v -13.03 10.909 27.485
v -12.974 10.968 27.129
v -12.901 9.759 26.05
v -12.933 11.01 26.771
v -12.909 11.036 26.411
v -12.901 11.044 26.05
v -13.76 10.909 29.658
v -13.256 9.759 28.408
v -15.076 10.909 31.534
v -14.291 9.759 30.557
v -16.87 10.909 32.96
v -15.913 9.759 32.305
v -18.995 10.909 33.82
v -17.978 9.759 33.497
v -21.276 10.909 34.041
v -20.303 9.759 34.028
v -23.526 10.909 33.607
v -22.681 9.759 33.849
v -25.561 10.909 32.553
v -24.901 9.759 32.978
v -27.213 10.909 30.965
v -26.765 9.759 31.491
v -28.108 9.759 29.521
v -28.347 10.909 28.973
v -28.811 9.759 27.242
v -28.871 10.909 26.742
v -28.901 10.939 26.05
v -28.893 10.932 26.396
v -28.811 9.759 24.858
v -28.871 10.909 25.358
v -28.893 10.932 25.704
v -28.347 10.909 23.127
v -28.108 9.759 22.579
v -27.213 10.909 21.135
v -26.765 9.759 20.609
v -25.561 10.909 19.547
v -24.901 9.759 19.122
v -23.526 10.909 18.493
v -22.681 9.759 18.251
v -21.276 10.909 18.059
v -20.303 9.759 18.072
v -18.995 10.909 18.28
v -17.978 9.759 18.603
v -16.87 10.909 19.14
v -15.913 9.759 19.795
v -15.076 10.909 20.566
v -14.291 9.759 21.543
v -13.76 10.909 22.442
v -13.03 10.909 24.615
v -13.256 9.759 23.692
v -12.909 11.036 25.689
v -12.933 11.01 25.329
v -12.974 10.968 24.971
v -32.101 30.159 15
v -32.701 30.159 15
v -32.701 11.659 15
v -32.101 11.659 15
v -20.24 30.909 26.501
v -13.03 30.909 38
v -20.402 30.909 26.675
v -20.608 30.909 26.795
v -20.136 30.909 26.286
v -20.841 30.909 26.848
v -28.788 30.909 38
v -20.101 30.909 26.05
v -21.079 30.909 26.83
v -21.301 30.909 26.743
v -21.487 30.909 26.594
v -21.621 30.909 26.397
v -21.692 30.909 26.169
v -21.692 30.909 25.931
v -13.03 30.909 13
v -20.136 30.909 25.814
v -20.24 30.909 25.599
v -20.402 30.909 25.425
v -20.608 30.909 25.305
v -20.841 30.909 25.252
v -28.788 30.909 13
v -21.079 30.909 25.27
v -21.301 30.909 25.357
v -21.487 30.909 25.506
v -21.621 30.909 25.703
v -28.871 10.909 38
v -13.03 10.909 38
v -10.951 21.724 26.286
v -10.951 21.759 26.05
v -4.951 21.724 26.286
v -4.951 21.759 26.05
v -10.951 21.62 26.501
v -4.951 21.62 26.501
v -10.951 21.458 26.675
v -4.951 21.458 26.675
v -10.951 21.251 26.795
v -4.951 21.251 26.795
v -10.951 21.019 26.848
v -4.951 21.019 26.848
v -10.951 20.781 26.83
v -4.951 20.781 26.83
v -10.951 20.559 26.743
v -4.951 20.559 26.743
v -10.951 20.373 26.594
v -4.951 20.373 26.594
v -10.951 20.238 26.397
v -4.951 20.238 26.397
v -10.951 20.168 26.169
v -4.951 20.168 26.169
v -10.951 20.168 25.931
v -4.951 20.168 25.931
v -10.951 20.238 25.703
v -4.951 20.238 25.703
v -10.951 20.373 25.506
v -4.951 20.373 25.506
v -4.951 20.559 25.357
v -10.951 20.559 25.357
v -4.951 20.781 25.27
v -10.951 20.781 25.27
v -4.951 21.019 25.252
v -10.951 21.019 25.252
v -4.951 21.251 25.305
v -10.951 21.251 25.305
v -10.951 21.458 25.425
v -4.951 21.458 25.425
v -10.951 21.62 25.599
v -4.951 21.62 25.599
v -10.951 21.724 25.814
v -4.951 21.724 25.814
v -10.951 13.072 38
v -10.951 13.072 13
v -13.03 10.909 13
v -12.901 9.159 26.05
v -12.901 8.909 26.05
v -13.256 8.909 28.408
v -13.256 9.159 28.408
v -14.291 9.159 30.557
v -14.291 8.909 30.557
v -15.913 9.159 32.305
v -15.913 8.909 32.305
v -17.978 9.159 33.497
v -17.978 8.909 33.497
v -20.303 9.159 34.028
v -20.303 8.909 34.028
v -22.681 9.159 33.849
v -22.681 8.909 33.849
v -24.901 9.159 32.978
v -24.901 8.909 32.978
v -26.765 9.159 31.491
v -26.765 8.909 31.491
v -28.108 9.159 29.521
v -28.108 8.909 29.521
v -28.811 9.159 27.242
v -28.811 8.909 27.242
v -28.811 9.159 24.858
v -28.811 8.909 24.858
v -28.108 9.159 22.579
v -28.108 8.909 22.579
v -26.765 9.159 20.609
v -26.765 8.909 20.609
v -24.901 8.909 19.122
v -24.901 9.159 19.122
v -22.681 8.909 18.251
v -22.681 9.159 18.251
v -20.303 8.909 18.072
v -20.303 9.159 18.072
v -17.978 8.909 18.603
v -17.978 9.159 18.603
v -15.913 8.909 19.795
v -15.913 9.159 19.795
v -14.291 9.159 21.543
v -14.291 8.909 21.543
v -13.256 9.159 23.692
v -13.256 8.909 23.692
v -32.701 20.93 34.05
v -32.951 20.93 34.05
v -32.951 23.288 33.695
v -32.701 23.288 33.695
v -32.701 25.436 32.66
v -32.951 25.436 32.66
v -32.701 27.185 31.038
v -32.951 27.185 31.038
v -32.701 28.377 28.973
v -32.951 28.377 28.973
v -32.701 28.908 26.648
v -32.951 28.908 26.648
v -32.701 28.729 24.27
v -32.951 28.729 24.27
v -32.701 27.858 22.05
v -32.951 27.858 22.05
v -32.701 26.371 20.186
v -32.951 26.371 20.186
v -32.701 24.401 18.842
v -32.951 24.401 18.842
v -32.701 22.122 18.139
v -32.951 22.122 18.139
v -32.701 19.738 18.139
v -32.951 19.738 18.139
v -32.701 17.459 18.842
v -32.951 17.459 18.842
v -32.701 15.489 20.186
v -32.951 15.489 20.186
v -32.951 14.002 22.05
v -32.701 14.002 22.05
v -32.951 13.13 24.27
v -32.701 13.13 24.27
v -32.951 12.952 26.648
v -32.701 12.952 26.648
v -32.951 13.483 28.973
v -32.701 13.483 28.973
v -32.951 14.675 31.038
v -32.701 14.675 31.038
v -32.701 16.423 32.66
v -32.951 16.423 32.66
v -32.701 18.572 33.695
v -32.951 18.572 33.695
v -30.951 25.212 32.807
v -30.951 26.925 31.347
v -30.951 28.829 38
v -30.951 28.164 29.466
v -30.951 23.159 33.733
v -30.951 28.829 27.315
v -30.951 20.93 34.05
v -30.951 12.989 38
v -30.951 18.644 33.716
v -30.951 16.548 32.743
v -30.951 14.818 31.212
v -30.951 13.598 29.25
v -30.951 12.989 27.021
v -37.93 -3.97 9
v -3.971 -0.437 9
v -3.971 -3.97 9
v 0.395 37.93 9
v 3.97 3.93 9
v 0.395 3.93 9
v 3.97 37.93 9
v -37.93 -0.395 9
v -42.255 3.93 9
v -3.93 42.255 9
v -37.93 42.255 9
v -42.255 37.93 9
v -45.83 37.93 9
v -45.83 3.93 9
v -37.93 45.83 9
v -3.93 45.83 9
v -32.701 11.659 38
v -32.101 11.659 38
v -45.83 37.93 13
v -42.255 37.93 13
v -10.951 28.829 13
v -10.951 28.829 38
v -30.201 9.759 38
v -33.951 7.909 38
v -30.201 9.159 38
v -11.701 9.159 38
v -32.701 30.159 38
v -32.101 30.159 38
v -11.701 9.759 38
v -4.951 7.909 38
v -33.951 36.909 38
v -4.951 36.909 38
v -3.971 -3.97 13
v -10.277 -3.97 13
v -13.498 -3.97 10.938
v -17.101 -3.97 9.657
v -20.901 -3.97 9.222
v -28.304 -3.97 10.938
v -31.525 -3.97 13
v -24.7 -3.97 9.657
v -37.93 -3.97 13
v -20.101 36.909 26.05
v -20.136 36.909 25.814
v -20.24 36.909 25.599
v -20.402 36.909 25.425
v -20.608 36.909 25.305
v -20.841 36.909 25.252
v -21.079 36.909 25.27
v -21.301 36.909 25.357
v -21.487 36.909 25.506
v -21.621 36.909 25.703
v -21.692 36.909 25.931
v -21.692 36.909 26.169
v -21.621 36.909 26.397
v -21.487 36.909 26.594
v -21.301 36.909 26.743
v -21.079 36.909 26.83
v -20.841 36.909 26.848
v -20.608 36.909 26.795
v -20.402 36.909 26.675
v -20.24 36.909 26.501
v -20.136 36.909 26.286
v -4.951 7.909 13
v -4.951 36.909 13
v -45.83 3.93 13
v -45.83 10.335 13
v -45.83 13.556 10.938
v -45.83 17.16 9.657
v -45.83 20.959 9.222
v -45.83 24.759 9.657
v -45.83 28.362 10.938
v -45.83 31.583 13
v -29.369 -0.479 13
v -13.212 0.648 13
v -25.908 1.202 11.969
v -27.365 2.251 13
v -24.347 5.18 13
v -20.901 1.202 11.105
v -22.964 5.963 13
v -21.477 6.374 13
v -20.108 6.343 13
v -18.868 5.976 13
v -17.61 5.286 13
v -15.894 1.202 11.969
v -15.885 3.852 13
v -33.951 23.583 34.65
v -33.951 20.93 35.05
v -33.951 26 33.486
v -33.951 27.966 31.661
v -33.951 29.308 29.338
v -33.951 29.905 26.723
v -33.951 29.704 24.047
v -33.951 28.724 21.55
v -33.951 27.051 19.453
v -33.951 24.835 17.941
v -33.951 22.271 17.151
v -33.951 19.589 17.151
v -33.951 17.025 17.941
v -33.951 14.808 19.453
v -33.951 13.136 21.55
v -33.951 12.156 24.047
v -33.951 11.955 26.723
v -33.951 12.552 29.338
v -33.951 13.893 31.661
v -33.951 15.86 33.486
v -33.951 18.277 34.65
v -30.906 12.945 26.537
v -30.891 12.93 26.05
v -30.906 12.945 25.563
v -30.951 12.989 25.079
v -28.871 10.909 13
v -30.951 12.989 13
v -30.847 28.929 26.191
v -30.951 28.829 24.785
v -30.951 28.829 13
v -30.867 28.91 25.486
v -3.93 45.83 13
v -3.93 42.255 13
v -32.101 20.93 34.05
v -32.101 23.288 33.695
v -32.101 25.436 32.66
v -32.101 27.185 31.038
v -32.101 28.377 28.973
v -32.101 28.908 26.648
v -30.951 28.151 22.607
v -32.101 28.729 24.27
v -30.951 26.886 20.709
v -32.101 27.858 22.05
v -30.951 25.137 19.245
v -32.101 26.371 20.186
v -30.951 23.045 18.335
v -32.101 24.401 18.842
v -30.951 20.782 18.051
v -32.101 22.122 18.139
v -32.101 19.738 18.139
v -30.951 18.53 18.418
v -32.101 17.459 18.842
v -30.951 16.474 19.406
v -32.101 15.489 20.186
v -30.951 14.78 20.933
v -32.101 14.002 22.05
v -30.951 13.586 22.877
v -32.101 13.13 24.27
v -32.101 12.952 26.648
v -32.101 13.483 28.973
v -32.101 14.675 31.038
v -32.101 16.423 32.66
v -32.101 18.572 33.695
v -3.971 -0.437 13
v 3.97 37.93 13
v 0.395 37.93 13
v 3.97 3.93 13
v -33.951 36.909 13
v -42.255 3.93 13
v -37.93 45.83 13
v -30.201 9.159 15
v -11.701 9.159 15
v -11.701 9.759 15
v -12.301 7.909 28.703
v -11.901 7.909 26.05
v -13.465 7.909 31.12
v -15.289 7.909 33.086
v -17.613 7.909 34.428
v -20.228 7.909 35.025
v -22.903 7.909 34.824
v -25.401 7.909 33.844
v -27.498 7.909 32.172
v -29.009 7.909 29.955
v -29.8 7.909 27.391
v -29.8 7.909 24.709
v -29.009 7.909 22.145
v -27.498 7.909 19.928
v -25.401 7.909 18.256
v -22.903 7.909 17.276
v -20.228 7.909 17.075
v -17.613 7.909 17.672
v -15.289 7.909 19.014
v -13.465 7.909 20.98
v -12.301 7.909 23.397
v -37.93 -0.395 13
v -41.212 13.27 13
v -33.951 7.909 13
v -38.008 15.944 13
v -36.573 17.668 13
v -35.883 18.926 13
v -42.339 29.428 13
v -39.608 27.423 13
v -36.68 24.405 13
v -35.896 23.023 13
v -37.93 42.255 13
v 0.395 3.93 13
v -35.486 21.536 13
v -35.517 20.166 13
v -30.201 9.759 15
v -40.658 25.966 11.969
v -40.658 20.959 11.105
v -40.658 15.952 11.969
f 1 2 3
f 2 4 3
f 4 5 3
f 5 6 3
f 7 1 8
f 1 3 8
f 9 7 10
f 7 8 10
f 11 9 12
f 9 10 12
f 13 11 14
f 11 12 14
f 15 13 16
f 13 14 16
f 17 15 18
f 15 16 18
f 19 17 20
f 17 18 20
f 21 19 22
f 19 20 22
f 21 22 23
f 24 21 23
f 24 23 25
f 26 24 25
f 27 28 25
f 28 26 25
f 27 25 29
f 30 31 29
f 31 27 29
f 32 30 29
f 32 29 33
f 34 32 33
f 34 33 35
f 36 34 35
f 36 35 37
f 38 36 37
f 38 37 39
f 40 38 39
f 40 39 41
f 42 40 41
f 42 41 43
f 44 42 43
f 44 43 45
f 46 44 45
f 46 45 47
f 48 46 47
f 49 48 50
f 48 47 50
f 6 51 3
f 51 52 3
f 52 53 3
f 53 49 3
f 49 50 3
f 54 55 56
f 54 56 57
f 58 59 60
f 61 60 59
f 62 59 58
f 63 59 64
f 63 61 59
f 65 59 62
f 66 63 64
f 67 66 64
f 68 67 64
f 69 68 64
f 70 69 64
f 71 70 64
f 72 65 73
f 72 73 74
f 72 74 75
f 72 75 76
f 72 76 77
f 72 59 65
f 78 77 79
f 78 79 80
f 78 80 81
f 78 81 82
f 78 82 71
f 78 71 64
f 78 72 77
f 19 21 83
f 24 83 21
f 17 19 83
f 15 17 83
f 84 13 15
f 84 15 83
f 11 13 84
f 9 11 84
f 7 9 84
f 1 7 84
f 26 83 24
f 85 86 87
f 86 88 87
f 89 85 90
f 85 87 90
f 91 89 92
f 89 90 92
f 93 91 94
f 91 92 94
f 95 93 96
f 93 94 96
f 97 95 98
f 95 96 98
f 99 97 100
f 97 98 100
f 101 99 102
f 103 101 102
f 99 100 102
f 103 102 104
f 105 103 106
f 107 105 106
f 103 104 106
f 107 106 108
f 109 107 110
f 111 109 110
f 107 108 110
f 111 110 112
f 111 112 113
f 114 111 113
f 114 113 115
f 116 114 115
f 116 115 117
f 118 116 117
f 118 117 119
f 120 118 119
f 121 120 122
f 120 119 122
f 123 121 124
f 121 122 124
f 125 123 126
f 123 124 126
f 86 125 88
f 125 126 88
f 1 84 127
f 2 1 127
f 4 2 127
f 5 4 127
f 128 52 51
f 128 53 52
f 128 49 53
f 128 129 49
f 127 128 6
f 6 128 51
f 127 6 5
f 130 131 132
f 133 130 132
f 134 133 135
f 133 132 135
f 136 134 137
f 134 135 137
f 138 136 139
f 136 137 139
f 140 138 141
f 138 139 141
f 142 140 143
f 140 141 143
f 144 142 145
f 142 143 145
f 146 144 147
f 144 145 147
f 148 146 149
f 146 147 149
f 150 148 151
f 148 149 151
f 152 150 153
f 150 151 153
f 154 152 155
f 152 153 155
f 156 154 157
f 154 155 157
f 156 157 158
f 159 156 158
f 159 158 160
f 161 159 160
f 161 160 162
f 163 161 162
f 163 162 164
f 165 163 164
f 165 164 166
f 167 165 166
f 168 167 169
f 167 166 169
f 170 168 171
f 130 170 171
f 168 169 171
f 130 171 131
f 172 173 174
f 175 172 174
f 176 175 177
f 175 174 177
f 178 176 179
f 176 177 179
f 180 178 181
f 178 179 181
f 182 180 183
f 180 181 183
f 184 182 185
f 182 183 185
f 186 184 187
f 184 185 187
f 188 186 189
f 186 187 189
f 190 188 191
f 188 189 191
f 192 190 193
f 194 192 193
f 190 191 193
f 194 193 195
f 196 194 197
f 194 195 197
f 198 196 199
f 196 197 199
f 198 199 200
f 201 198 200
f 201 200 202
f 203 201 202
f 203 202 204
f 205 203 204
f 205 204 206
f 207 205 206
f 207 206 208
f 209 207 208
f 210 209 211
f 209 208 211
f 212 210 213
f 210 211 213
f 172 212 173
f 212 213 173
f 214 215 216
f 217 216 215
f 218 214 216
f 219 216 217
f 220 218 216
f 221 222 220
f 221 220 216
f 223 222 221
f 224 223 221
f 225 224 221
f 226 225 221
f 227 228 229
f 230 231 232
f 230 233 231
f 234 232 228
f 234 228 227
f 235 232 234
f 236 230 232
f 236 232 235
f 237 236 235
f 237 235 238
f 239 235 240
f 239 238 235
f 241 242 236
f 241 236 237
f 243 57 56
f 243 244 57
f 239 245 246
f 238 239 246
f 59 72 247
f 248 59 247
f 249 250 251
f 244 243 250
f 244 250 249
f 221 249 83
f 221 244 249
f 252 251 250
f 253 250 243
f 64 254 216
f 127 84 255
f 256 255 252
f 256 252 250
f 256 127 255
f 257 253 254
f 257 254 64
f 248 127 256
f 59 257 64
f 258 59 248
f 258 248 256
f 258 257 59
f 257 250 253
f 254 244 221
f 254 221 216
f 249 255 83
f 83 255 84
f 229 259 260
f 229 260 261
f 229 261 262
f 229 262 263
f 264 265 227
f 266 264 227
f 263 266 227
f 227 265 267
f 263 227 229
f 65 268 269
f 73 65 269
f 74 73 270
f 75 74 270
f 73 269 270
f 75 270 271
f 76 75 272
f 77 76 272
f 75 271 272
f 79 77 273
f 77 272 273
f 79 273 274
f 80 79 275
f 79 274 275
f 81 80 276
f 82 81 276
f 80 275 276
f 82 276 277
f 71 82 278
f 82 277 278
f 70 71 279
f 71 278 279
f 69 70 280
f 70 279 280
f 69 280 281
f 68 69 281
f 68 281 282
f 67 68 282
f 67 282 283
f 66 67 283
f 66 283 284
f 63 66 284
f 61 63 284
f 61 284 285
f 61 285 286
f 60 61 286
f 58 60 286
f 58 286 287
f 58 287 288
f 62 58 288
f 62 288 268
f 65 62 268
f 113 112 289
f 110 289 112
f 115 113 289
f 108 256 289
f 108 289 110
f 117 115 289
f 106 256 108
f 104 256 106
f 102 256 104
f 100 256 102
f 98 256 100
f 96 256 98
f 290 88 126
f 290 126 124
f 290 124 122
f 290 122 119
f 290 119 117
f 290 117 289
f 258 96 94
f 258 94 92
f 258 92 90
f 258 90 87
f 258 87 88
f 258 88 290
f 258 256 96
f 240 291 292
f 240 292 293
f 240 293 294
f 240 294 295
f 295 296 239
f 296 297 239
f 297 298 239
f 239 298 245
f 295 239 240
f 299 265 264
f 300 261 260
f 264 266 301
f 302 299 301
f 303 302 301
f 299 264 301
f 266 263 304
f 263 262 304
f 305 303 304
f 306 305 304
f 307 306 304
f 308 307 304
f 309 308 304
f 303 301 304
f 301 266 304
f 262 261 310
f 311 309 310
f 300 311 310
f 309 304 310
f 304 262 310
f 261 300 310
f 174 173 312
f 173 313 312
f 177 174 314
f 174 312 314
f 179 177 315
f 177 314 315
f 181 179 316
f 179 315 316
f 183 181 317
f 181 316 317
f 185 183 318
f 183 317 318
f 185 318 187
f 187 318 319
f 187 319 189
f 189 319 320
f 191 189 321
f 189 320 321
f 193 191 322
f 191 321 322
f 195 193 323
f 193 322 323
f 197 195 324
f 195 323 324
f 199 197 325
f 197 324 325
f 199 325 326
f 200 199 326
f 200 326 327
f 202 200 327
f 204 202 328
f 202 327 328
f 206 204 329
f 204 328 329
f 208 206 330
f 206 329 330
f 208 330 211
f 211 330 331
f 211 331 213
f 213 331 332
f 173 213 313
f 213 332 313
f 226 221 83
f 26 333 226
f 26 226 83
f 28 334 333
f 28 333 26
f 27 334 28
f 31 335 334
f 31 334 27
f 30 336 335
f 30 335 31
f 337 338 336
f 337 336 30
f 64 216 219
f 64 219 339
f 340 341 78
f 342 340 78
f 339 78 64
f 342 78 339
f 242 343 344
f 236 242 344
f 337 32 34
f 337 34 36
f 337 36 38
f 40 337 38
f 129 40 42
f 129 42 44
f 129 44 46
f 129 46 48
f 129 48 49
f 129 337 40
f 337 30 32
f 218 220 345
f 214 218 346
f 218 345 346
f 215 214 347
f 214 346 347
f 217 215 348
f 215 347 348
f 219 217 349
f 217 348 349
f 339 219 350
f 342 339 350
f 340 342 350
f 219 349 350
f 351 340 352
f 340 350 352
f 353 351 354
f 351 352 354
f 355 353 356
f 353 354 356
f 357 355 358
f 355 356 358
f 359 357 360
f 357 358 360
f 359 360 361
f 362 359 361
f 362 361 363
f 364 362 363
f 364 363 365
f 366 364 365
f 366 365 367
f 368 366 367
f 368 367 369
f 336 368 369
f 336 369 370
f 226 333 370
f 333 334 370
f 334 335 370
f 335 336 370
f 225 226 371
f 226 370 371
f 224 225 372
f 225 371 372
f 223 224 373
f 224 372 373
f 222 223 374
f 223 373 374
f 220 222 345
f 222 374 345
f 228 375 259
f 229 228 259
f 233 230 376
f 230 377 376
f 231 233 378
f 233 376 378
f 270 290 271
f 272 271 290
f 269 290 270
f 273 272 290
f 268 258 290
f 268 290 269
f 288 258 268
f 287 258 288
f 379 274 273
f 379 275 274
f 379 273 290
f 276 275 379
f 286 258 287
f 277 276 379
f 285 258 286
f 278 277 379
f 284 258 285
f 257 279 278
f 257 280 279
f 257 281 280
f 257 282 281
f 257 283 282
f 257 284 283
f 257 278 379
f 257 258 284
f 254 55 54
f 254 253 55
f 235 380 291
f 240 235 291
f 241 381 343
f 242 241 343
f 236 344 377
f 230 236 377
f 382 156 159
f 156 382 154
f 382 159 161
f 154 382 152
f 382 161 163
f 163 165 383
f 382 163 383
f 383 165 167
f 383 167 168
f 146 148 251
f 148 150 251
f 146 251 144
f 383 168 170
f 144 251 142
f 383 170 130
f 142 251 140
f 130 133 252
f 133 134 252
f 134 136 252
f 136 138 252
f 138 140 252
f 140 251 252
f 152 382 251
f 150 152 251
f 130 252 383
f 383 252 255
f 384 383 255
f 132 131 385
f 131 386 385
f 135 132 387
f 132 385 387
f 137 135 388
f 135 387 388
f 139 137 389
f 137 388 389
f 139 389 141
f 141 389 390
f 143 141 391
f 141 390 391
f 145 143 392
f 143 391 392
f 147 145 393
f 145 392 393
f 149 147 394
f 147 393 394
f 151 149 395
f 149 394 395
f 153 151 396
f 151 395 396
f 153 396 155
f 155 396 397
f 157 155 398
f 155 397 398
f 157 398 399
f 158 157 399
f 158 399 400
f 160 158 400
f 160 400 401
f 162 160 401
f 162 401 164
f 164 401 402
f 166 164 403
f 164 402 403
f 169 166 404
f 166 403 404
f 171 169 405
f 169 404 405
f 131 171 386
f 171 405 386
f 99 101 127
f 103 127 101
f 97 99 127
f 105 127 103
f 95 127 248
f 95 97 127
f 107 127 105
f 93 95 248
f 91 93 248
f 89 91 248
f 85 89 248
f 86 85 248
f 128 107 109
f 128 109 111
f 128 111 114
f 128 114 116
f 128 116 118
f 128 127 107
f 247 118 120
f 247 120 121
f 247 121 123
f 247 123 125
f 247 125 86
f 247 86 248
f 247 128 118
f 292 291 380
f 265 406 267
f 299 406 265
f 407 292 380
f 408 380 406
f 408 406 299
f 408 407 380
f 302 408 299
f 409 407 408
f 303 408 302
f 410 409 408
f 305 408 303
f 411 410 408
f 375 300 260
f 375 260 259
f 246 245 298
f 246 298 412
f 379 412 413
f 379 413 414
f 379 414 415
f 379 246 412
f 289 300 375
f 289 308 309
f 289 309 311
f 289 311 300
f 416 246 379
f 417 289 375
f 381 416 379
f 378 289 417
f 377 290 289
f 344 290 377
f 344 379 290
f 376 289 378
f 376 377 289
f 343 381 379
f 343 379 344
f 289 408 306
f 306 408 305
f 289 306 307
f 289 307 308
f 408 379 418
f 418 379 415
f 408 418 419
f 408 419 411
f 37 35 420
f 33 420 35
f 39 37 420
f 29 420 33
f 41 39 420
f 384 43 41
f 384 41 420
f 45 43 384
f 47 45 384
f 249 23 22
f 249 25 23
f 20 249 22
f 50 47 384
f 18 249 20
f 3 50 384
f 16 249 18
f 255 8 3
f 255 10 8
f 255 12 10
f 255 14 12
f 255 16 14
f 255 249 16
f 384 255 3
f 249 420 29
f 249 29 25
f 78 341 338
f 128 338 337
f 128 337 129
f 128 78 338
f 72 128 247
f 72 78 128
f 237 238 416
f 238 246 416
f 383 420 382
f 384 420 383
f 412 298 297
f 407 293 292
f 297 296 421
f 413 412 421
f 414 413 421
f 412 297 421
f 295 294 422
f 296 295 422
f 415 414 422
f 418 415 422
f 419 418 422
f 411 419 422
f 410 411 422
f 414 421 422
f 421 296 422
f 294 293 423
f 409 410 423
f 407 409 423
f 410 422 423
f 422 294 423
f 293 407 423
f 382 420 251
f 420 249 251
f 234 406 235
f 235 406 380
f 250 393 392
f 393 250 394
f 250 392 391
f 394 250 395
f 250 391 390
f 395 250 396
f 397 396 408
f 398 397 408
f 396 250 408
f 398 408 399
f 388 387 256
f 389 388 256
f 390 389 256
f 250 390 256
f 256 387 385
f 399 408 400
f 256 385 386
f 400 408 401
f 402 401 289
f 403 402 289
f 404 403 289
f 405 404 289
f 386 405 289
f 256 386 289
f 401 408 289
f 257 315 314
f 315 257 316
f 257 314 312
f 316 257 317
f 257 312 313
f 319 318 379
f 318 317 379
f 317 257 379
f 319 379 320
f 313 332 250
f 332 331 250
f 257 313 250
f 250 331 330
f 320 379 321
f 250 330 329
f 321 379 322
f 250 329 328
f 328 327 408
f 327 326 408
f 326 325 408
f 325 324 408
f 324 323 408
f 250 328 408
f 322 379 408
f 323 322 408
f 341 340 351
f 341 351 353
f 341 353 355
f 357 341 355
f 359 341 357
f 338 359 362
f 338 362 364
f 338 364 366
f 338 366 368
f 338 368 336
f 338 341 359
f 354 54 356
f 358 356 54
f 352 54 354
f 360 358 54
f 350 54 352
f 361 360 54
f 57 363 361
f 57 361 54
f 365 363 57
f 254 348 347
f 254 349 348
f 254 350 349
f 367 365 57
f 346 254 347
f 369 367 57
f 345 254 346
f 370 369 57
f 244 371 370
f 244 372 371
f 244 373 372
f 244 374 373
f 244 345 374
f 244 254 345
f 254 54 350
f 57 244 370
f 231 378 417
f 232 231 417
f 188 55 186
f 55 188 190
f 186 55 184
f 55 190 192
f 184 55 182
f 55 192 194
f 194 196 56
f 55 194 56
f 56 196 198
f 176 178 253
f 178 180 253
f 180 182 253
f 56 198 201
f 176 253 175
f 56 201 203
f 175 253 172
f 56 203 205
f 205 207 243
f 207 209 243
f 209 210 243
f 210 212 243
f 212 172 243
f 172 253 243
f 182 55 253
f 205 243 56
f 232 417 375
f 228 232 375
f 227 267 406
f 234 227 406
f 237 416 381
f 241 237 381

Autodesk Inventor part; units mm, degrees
ref_plane "YZ Plane" through (0, 0, 0) normal (1, 0, 0) x (0, 1, 0)
ref_plane "XZ Plane" through (0, 0, 0) normal (0, 1, 0) x (-1, 0, 0)
ref_plane "Work Plane1" through (0, 0, 10) normal (0, 0, 1) x (1, 0, 0)
sketch "Sketch1" plane through (0, 0, 10) normal (0, 0, 1) x (1, 0, 0)
  line L0 (-4.0299, -0.3538) -> (-2.2322, 1.4439) construction
  arc A0 (-1.4439, 2.2322) -> (-2.2322, 1.4439) centre (-0.9299, 0.9299) ccw construction
  line L1 (-1.4439, 2.2322) -> (0.3538, 4.0299) construction
  line L2 (-37.8299, 42.8299) -> (-37.8299, 37.8299) construction
  line L3 (-37.8299, 37.8299) -> (-42.9208, 37.8299) construction
  line L4 (-37.8299, 42.2137) -> (-37.8299, 45.8299) construction
  line L5 (-37.8299, 45.8299) -> (-4.0299, 45.8299) construction
  line L6 (-4.0299, 45.8299) -> (-4.0299, 42.2137) construction
  line L7 (-4.0299, 4.0299) -> (0.3538, 4.0299) projected
  circle A1 centre (-20.9299, 20.9299) radius 17.5 projected
  line L8 (-20.9299, 58.9723) -> (17.1124, 20.9299) construction
  line L9 (17.1124, 20.9299) -> (-20.9299, -17.1124) construction
  line L10 (-20.9299, -17.1124) -> (-58.9723, 20.9299) construction
  line L11 (-58.9723, 20.9299) -> (-20.9299, 58.9723) construction
  line L12 (-20.9299, 58.9723) -> (-20.9299, -17.1124) construction
  line L13 (17.1124, 20.9299) -> (-58.9723, 20.9299) construction
  line L14 (-20.9299, 58.9723) -> (32.8701, 58.9723) construction
  line L15 (-43.4299, 43.4299) -> (1.5701, 43.4299) construction
  line L16 (1.5701, 43.4299) -> (1.5701, -1.5701) construction
  line L17 (1.5701, -1.5701) -> (-43.4299, -1.5701) construction
  line L18 (-43.4299, -1.5701) -> (-43.4299, 43.4299) construction
  line L19 (-43.4299, 43.4299) -> (1.5701, -1.5701) construction
  line L20 (1.5701, 43.4299) -> (-43.4299, -1.5701) construction
  line L21 (-43.4299, 5.3876) -> (-43.4299, 36.4723)
  line L22 (-43.4299, 36.4723) -> (-36.4723, 43.4299)
  line L23 (-36.4723, 43.4299) -> (-5.3876, 43.4299)
  line L24 (-5.3876, 43.4299) -> (1.5701, 36.4723)
  line L25 (1.5701, 36.4723) -> (1.5701, 5.3876)
  line L26 (1.5701, 5.3876) -> (-5.3876, -1.5701)
  line L27 (-5.3876, -1.5701) -> (-36.4723, -1.5701)
  line L28 (-36.4723, -1.5701) -> (-43.4299, 5.3876)
  line L29 (-4.0299, 42.2137) -> (-37.8299, 42.2137) projected
  line L30 (-4.0299, -0.3538) -> (-4.0299, 4.0299) projected
  circle A2 centre (-20.9299, 20.9299) radius 1.5
  line L31 (-10.9299, 10.9299) -> (-30.9299, 10.9299) construction
  line L32 (-30.9299, 10.9299) -> (-30.9299, 30.9299) construction
  line L33 (-30.9299, 30.9299) -> (-10.9299, 30.9299) construction
  line L34 (-10.9299, 30.9299) -> (-10.9299, 10.9299) construction
  line L35 (-10.9299, 10.9299) -> (-30.9299, 30.9299) construction
  line L36 (-30.9299, 10.9299) -> (-10.9299, 30.9299) construction
  circle A3 centre (-30.9299, 30.9299) radius 1.4
  circle A4 centre (-30.9299, 10.9299) radius 1.4
  circle A5 centre (-10.9299, 10.9299) radius 1.4
  line L37 (-45.8299, 37.8299) -> (-42.0723, 37.8299) construction
  line L38 (-42.1723, 37.7299) -> (-45.8299, 37.7299)
  line L39 (-45.8299, 37.7299) -> (-45.8299, 4.1299)
  line L40 (-45.8299, 4.1299) -> (-42.1723, 4.1299)
  line L41 (-42.1723, 4.1299) -> (-42.1723, 37.7299)
  line L42 (-45.8299, 4.0299) -> (-42.0723, 4.0299) construction
  line L43 (-45.8299, 37.8299) -> (-42.0723, 37.8299) projected
  line L44 (-37.7299, 45.8299) -> (-4.1299, 45.8299)
  line L45 (-4.1299, 45.8299) -> (-4.1299, 42.1723)
  line L46 (-4.1299, 42.1723) -> (-37.7299, 42.1723)
  line L47 (-37.7299, 42.1723) -> (-37.7299, 45.8299)
  line L48 (0.4701, 37.8299) -> (0.4701, 4.0299) construction
  line L49 (0.4701, 4.0299) -> (3.9701, 4.0299) construction
  line L50 (3.9701, 37.8299) -> (3.9701, 4.0299) construction
  line L51 (0.4701, 37.8299) -> (3.9701, 37.8299) construction
  line L52 (-45.8299, -3.9701) -> (-4.0299, -3.9701) construction
  line L53 (0.3124, 37.7299) -> (3.9701, 37.7299)
  line L54 (3.9701, 37.7299) -> (3.9701, 4.1299)
  line L55 (3.9701, 4.1299) -> (0.3124, 4.1299)
  line L56 (0.3124, 4.1299) -> (0.3124, 37.7299)
  line L57 (-4.1713, -0.3538) -> (-37.7299, -0.3538)
  line L58 (-37.7299, -0.3538) -> (-37.7299, -3.9701)
  line L59 (-37.7299, -3.9701) -> (-4.1713, -3.9701)
  line L60 (-4.1713, -3.9701) -> (-4.1713, -0.3538)
  point P0 (-37.8299, 4.0299)
  dimension "d18" = 53.8
  dimension "d19" = 45
  dimension "d20" = 53.8
  dimension "d21" = 45
  dimension "d22" = 45
  dimension "d30" = 20
  dimension "d31" = 20
  dimension "d32" = 2.8
  dimension "d33" = 2.8
  dimension "d34" = 2.8
  dimension "d35" = 3
  dimension "d36" = 0.1
  dimension "d37" = 0.1
  dimension "d38" = 0.1
  dimension "d39" = 0.1
extrude "Extrusion1" add sketch "Sketch1" along normal blind 3 contours L30 L26 L57 L28 L41 L22 L46 L24 L56 L7 | L7 L26 L30 | L56 L24 L25 L26 | L26 L25 L24 L53 L54 L55 | L60 L59 L58 L57 L28 L27 L26 | L26 L27 L28 L57 | L46 L22 L29 L24 | L24 L29 L45 | L40 L39 L38 L22 L21 L28 | L28 L21 L22 L41 | L29 L22 L23 L24 | L24 L23 L22 L29 L47 L44 L45 | L47 L29 L22 | A1 | A2 | A3 | A4 | A5
sketch "Skizze4" plane through (0, 0, 13) normal (0, 0, 1) x (1, 0, 0)
  line L0 (-37.7299, 42.1723) -> (-42.1723, 37.7299) projected
  line L1 (-42.1723, 37.7299) -> (-45.8299, 37.7299) projected
  line L2 (-45.8299, 37.7299) -> (-45.8299, 4.1299) construction
  line L3 (-45.8299, 4.1299) -> (-42.1723, 4.1299) projected
  line L4 (-42.1723, 4.1299) -> (-37.6885, -0.3538) projected
  line L5 (-37.6885, -0.3538) -> (-37.7299, -0.3538) projected
  line L6 (-37.7299, -0.3538) -> (-37.7299, -3.9701) projected
  line L7 (-37.7299, -3.9701) -> (-4.1713, -3.9701) construction
  line L8 (-4.1713, -3.9701) -> (-4.1713, -0.3538) projected
  line L9 (-4.1713, -0.3538) -> (0.3124, 4.1299) projected
  line L10 (0.3124, 4.1299) -> (3.9701, 4.1299) projected
  line L11 (3.9701, 4.1299) -> (3.9701, 37.7299) construction
  line L12 (3.9701, 37.7299) -> (0.3124, 37.7299) projected
  line L13 (0.3124, 37.7299) -> (-4.1299, 42.1723) projected
  line L14 (-4.1299, 42.1723) -> (-4.1299, 45.8299) projected
  line L15 (-4.1299, 45.8299) -> (-37.7299, 45.8299) construction
  line L16 (-37.7299, 45.8299) -> (-37.7299, 42.1723) projected
  line L17 (-37.9299, 46.0299) -> (-3.9299, 46.0299) construction
  line L18 (-3.9299, 46.0299) -> (-3.9299, 42.2551)
  line L19 (-3.9299, 42.2551) -> (0.3953, 37.9299)
  line L20 (0.3953, 37.9299) -> (4.1701, 37.9299)
  line L21 (4.1701, 37.9299) -> (4.1701, 3.9299) construction
  line L22 (4.1701, 3.9299) -> (0.3953, 3.9299)
  line L23 (0.3953, 3.9299) -> (-3.9713, -0.4367)
  line L24 (-3.9713, -0.4367) -> (-3.9713, -4.1701)
  line L25 (-3.9713, -4.1701) -> (-37.9299, -4.1701) construction
  line L26 (-37.9299, -4.1701) -> (-37.9299, -0.3953)
  line L27 (-37.9299, -0.3953) -> (-42.2551, 3.9299)
  line L28 (-42.2551, 3.9299) -> (-46.0299, 3.9299)
  line L29 (-46.0299, 3.9299) -> (-46.0299, 37.9299) construction
  line L30 (-46.0299, 37.9299) -> (-42.2551, 37.9299)
  line L31 (-42.2551, 37.9299) -> (-37.9299, 42.2551)
  line L32 (-37.9299, 42.2551) -> (-37.9299, 46.0299)
  line L33 (-45.8299, 37.7299) -> (-45.8299, 37.9299)
  line L34 (-4.1299, 45.8299) -> (-37.7299, 45.8299) projected
  line L35 (-37.7299, 45.8299) -> (-37.9299, 45.8299)
  line L36 (-4.1299, 45.8299) -> (-3.9299, 45.8299)
  line L37 (3.9701, 37.7299) -> (3.9701, 37.9299)
  line L38 (3.9701, 4.1299) -> (3.9701, 37.7299) projected
  line L39 (3.9701, 4.1299) -> (3.9701, 3.9299)
  line L40 (-4.1713, -3.9701) -> (-3.9713, -3.9701)
  line L41 (-37.7299, -3.9701) -> (-37.9299, -3.9701)
  line L42 (-45.8299, 4.1299) -> (-45.8299, 3.9299)
  point P0 (0, 0)
  dimension "d40" = 0.2
extrude "IM_offset" add sketch "Skizze4" against normal up to surface (3 mm away)
ref_plane "Arbeitsebene5" through (-20.9299, 3.9299, 10) normal (1, 0, 0) x (0, 0, -1)
ref_plane "Arbeitsebene6" through (-37.9299, 20.9299, 10) normal (0, 1, 0) x (1, 0, 0)
sketch "Skizze25" plane through (0, 0, 13) normal (0, 0, 1) x (1, 0, 0)
  line L0 (3.9701, 3.9299) -> (3.9701, 37.9299) projected
  line L1 (3.9701, 37.9299) -> (0.3953, 37.9299) projected
  line L2 (0.3953, 37.9299) -> (-3.9299, 42.2551) projected
  line L3 (-3.9299, 42.2551) -> (-3.9299, 45.8299) projected
  line L4 (-3.9299, 45.8299) -> (-37.9299, 45.8299) projected
  line L5 (-37.9299, 45.8299) -> (-37.9299, 42.2551) projected
  line L6 (-37.9299, 42.2551) -> (-42.2551, 37.9299) projected
  line L7 (-42.2551, 37.9299) -> (-45.8299, 37.9299) projected
  line L8 (-45.8299, 37.9299) -> (-45.8299, 3.9299) projected
  line L9 (-42.2551, 3.9299) -> (-45.8299, 3.9299) projected
  line L10 (-37.9299, -0.3953) -> (-42.2551, 3.9299) projected
  line L11 (-37.9299, -3.9701) -> (-37.9299, -0.3953) projected
  line L12 (-3.9713, -3.9701) -> (-37.9299, -3.9701) projected
  line L13 (-3.9713, -3.9701) -> (-3.9713, -0.4367) projected
  line L14 (-3.9713, -0.4367) -> (0.3953, 3.9299) projected
  line L15 (0.3953, 3.9299) -> (3.9701, 3.9299) projected
  line L16 (-9.2627, 11.384) -> (-30.4759, 32.5972)
  line L17 (-11.384, 9.2627) -> (-32.5972, 30.4759)
  line L18 (-10.9506, 30.9092) -> (-30.9506, 30.9092)
  line L19 (-30.9506, 30.9092) -> (-30.9506, 10.9092)
  line L20 (-30.9506, 10.9092) -> (-10.9506, 10.9092)
  line L21 (-10.9506, 10.9092) -> (-10.9506, 30.9092)
  line L22 (-10.9506, 30.9092) -> (-30.9506, 10.9092) construction
  line L23 (-30.9506, 30.9092) -> (-10.9506, 10.9092) construction
  line L24 (-7.9506, 33.9092) -> (-33.9506, 33.9092)
  line L25 (-33.9506, 33.9092) -> (-33.9506, 7.9092)
  line L26 (-33.9506, 7.9092) -> (-7.9506, 7.9092)
  line L27 (-7.9506, 7.9092) -> (-7.9506, 33.9092)
  line L28 (-10.9506, 14.9092) -> (-7.9506, 14.9092)
  line L29 (-26.9506, 30.9092) -> (-26.9506, 33.9092)
  line L30 (-13.0305, 10.9092) -> (-10.9506, 13.072)
  line L31 (-30.9506, 28.8293) -> (-28.7879, 30.9092)
  line L32 (-13.0305, 30.9092) -> (-10.9506, 28.8293)
  line L33 (-30.9506, 12.9891) -> (-28.8707, 10.9092)
  point P0 (0, 0)
  point P1 (-20.9506, 20.9092)
  dimension "d150" = 20
  dimension "d151" = 20
  dimension "d152" = 3
  dimension "d153" = 7
  dimension "d154" = 7
extrude "Extrusion21" add sketch "Skizze25" along normal blind 25 contours L21 L28 L27 L26 L25 L24 L29 L18 L19 L20 | L21 L20 L30 | L31 L19 L18 | L21 L18 L29 L24 L27 L28 | L32 L18 L21 | L20 L19 L33
ref_plane "Arbeitsebene9" through (0, 0, 42) normal (0, 0, 1) x (1, 0, 0)
sketch "Skizze27" plane through (0, 0, 38) normal (0, 0, 1) x (1, 0, 0)
  line L0 (-26.9506, 32.6592) -> (-32.7006, 32.6592)
  line L1 (-32.7006, 32.6592) -> (-32.7006, 9.1592)
  line L2 (-32.7006, 9.1592) -> (-9.2006, 9.1592)
  line L3 (-9.2006, 9.1592) -> (-9.2006, 14.9092)
  arc A0 (-9.2006, 14.9092) -> (-26.9506, 32.6592) centre (-26.9506, 14.9092) ccw
  line L4 (-26.9506, 32.0592) -> (-32.1006, 32.0592)
  line L5 (-32.1006, 32.0592) -> (-32.1006, 9.7592)
  line L6 (-32.1006, 9.7592) -> (-9.8006, 9.7592)
  line L7 (-9.8006, 9.7592) -> (-9.8006, 14.9092)
  arc A1 (-9.8006, 14.9092) -> (-26.9506, 32.0592) centre (-26.9506, 14.9092) ccw
  line L8 (-9.2006, 13.072) -> (-9.8006, 13.072)
  line L9 (-28.7879, 32.0592) -> (-28.7879, 32.6592)
  line L10 (-30.2006, 9.1592) -> (-11.7006, 9.1592)
  line L11 (-11.7006, 9.1592) -> (-11.7006, 9.7592)
  line L12 (-11.7006, 9.7592) -> (-30.2006, 9.7592)
  line L13 (-30.2006, 9.7592) -> (-30.2006, 9.1592)
  line L14 (-30.2006, 9.1592) -> (-11.7006, 9.7592) construction
  line L15 (-11.7006, 9.1592) -> (-30.2006, 9.7592) construction
  line L16 (-32.7006, 30.1592) -> (-32.1006, 30.1592)
  line L17 (-32.1006, 30.1592) -> (-32.1006, 11.6592)
  line L18 (-32.1006, 11.6592) -> (-32.7006, 11.6592)
  line L19 (-32.7006, 11.6592) -> (-32.7006, 30.1592)
  line L20 (-32.7006, 30.1592) -> (-32.1006, 11.6592) construction
  line L21 (-32.1006, 30.1592) -> (-32.7006, 11.6592) construction
  point P0 (0, 0)
  point P1 (-20.9506, 9.4592)
  point P2 (-20.9506, 9.1592)
  point P3 (-32.4006, 20.9092)
  point P4 (-32.7006, 20.9092)
  point P5 (-28.7879, 30.9092)
  point P6 (-10.9506, 13.072)
  dimension "d159" = 0.6
  dimension "d163" = 18.5
  dimension "d164" = 18.5
  dimension "d173" = 0
  dimension "d174" = 0
extrude "Extrusion23" cut sketch "Skizze27" against normal blind 23 contours L16 L5 L18 L1 | L2 L13 L6 L11
sketch "Skizze28" plane through (-33.9506, 7.9092, 13) normal (-1, 0, 0) x (0, 0, 1)
  line L0 (51.2, 13.0207) -> (-25.1, 13.0207)
  circle A0 centre (13.05, 13.0207) radius 8
  point P0 (-13, -7.9092)
  dimension "d165" = 16
extrude "Extrusion24" cut sketch "Skizze28" against normal blind 4
sketch "Skizze29" plane through (-33.9506, 7.9092, 13) normal (0, -1, 0) x (1, 0, 0)
  line L0 (0, 5.05) -> (0, 21.05) projected
  circle A0 centre (13.0499, 13.05) radius 8
  point P0 (33.9506, -13)
  dimension "d168" = 16
extrude "Extrusion25" cut sketch "Skizze29" against normal blind 4
ref_plane "Arbeitsebene7" through (-20.9299, 20.9299, 26.13) normal (-0.7071068, 0.7071068, 0) x (0.7071068, 0.7071068, 0)
ref_plane "Arbeitsebene8" through (-30.8674, 33.0715, 13) normal (0.6931675, -0.7207765, 0) x (0.7207765, 0.6931675, 0)
sketch "Skizze32" plane through (0, 0, 10) normal (0, 0, -1) x (-1, 0, 0)
  line L0 (3.9713, -3.9701) -> (37.9299, -3.9701) projected
  line L1 (37.9299, -3.9701) -> (37.9299, -0.3953) projected
  line L2 (37.9299, -0.3953) -> (42.2551, 3.9299) projected
  line L3 (42.2551, 3.9299) -> (45.8299, 3.9299) projected
  line L4 (45.8299, 3.9299) -> (45.8299, 37.9299) projected
  line L5 (45.8299, 37.9299) -> (42.2551, 37.9299) projected
  line L6 (42.2551, 37.9299) -> (37.9299, 42.2551) projected
  line L7 (37.9299, 42.2551) -> (37.9299, 45.8299) projected
  line L8 (37.9299, 45.8299) -> (3.9299, 45.8299) projected
  line L9 (3.9299, 45.8299) -> (3.9299, 42.2551) projected
  line L10 (3.9299, 42.2551) -> (-0.3953, 37.9299) projected
  line L11 (-0.3953, 37.9299) -> (-3.9701, 37.9299) projected
  line L12 (-3.9701, 37.9299) -> (-3.9701, 3.9299) projected
  line L13 (-3.9701, 3.9299) -> (-0.3953, 3.9299) projected
  line L14 (-0.3953, 3.9299) -> (3.9713, -0.4367) projected
  line L15 (3.9713, -0.4367) -> (3.9713, -3.9701) projected
  point P0 (0, 0)
extrude "Extrusion28" add sketch "Skizze32" along normal blind 1
sketch "Skizze33" plane through (-37.9299, -3.9701, 13) normal (0, -1, 0) x (1, 0, 0)
  circle A0 centre (17.0292, 13.05) radius 8 projected
  circle A1 centre (17.0292, 13.05) radius 16.8276
  point P0 (37.9299, -13)
extrude "Extrusion29" cut sketch "Skizze33" against normal blind 11.879 draft -20 contours A0 | A1
sketch "Skizze34" plane through (0, 0, 38) normal (0, 0, 1) x (1, 0, 0)
  line L0 (-11.7006, 9.7592) -> (-11.7006, 9.1592) projected
  line L1 (-11.7006, 9.1592) -> (-30.2006, 9.1592) projected
  line L2 (-30.2006, 9.1592) -> (-30.2006, 9.7592) projected
  line L3 (-30.2006, 9.7592) -> (-11.7006, 9.7592) projected
  line L4 (-32.7006, 30.1592) -> (-32.1006, 30.1592) projected
  line L5 (-32.1006, 30.1592) -> (-32.1006, 11.6592) projected
  line L6 (-32.1006, 11.6592) -> (-32.7006, 11.6592) projected
  line L7 (-32.7006, 11.6592) -> (-32.7006, 30.1592) projected
  line L8 (-7.9506, 7.9092) -> (-7.9506, 33.9092) projected
  line L9 (-7.9506, 33.9092) -> (-33.9506, 33.9092) projected
  line L10 (-33.9506, 33.9092) -> (-33.9506, 7.9092) projected
  line L11 (-33.9506, 7.9092) -> (-7.9506, 7.9092) projected
  line L12 (-10.9506, 28.8293) -> (-10.9506, 13.072) projected
  line L13 (-10.9506, 13.072) -> (-13.0305, 10.9092) projected
  line L14 (-13.0305, 10.9092) -> (-28.8707, 10.9092) projected
  line L15 (-28.8707, 10.9092) -> (-30.9506, 12.9891) projected
  line L16 (-30.9506, 12.9891) -> (-30.9506, 28.8293) projected
  line L17 (-30.9506, 28.8293) -> (-28.7879, 30.9092) projected
  line L18 (-28.7879, 30.9092) -> (-13.0305, 30.9092) projected
  line L19 (-13.0305, 30.9092) -> (-10.9506, 28.8293) projected
  line L20 (-33.9506, 33.9092) -> (-7.9506, 33.9092) projected
  line L21 (-33.9506, 33.9092) -> (-7.9506, 33.9092)
  line L22 (-7.9506, 33.9092) -> (-7.9506, 36.9092)
  line L23 (-7.9506, 36.9092) -> (-33.9506, 36.9092)
  line L24 (-33.9506, 36.9092) -> (-33.9506, 33.9092)
  line L25 (-7.9506, 33.9092) -> (-7.9506, 7.9092) projected
  line L26 (-7.9506, 33.9092) -> (-4.9506, 36.9092)
  line L27 (-4.9506, 36.9092) -> (-7.9506, 36.9092)
  point P0 (0, 0)
  dimension "d183" = 3
extrude "Extrusion30" add sketch "Skizze34" against normal up to surface (25 mm away) contours L9 L24 L23 L22 | L22 L27 L26
sketch "Skizze35" plane through (-33.9506, 36.9092, 38) normal (0, 1, 0) x (1, 0, 0)
  line L0 (0, 25) -> (29, 25) projected
  line L1 (0, 0) -> (0, 25) projected
  line L2 (29, 0) -> (0, 0) projected
  line L3 (29, 0) -> (29, 25) projected
  arc A0 (20.9201, 13.3854) -> (5.0799, 12.6417) centre (13.0499, 11.95) ccw projected
  circle A1 centre (13.0499, 11.95) radius 0.8
  point P0 (33.9506, 38)
  dimension "d186" = 1.6
extrude "Extrusion31" cut sketch "Skizze35" against normal blind 10 contours A1
mirror "Spiegeln3" about plane through (-20.9299, 20.9299, 26.13) normal (-0.7071068, 0.7071068, 0) of "Extrusion29", "Extrusion30", "Extrusion31"
chamfer "Fase2" distance 1 angle 45 2 edges at (-28.9007, 7.9092, 26.05) (-33.9506, 20.9299, 18.05)
properties part number "20_Cube_Insert_Lightsheet_FEPTube_Pipette_v3"
